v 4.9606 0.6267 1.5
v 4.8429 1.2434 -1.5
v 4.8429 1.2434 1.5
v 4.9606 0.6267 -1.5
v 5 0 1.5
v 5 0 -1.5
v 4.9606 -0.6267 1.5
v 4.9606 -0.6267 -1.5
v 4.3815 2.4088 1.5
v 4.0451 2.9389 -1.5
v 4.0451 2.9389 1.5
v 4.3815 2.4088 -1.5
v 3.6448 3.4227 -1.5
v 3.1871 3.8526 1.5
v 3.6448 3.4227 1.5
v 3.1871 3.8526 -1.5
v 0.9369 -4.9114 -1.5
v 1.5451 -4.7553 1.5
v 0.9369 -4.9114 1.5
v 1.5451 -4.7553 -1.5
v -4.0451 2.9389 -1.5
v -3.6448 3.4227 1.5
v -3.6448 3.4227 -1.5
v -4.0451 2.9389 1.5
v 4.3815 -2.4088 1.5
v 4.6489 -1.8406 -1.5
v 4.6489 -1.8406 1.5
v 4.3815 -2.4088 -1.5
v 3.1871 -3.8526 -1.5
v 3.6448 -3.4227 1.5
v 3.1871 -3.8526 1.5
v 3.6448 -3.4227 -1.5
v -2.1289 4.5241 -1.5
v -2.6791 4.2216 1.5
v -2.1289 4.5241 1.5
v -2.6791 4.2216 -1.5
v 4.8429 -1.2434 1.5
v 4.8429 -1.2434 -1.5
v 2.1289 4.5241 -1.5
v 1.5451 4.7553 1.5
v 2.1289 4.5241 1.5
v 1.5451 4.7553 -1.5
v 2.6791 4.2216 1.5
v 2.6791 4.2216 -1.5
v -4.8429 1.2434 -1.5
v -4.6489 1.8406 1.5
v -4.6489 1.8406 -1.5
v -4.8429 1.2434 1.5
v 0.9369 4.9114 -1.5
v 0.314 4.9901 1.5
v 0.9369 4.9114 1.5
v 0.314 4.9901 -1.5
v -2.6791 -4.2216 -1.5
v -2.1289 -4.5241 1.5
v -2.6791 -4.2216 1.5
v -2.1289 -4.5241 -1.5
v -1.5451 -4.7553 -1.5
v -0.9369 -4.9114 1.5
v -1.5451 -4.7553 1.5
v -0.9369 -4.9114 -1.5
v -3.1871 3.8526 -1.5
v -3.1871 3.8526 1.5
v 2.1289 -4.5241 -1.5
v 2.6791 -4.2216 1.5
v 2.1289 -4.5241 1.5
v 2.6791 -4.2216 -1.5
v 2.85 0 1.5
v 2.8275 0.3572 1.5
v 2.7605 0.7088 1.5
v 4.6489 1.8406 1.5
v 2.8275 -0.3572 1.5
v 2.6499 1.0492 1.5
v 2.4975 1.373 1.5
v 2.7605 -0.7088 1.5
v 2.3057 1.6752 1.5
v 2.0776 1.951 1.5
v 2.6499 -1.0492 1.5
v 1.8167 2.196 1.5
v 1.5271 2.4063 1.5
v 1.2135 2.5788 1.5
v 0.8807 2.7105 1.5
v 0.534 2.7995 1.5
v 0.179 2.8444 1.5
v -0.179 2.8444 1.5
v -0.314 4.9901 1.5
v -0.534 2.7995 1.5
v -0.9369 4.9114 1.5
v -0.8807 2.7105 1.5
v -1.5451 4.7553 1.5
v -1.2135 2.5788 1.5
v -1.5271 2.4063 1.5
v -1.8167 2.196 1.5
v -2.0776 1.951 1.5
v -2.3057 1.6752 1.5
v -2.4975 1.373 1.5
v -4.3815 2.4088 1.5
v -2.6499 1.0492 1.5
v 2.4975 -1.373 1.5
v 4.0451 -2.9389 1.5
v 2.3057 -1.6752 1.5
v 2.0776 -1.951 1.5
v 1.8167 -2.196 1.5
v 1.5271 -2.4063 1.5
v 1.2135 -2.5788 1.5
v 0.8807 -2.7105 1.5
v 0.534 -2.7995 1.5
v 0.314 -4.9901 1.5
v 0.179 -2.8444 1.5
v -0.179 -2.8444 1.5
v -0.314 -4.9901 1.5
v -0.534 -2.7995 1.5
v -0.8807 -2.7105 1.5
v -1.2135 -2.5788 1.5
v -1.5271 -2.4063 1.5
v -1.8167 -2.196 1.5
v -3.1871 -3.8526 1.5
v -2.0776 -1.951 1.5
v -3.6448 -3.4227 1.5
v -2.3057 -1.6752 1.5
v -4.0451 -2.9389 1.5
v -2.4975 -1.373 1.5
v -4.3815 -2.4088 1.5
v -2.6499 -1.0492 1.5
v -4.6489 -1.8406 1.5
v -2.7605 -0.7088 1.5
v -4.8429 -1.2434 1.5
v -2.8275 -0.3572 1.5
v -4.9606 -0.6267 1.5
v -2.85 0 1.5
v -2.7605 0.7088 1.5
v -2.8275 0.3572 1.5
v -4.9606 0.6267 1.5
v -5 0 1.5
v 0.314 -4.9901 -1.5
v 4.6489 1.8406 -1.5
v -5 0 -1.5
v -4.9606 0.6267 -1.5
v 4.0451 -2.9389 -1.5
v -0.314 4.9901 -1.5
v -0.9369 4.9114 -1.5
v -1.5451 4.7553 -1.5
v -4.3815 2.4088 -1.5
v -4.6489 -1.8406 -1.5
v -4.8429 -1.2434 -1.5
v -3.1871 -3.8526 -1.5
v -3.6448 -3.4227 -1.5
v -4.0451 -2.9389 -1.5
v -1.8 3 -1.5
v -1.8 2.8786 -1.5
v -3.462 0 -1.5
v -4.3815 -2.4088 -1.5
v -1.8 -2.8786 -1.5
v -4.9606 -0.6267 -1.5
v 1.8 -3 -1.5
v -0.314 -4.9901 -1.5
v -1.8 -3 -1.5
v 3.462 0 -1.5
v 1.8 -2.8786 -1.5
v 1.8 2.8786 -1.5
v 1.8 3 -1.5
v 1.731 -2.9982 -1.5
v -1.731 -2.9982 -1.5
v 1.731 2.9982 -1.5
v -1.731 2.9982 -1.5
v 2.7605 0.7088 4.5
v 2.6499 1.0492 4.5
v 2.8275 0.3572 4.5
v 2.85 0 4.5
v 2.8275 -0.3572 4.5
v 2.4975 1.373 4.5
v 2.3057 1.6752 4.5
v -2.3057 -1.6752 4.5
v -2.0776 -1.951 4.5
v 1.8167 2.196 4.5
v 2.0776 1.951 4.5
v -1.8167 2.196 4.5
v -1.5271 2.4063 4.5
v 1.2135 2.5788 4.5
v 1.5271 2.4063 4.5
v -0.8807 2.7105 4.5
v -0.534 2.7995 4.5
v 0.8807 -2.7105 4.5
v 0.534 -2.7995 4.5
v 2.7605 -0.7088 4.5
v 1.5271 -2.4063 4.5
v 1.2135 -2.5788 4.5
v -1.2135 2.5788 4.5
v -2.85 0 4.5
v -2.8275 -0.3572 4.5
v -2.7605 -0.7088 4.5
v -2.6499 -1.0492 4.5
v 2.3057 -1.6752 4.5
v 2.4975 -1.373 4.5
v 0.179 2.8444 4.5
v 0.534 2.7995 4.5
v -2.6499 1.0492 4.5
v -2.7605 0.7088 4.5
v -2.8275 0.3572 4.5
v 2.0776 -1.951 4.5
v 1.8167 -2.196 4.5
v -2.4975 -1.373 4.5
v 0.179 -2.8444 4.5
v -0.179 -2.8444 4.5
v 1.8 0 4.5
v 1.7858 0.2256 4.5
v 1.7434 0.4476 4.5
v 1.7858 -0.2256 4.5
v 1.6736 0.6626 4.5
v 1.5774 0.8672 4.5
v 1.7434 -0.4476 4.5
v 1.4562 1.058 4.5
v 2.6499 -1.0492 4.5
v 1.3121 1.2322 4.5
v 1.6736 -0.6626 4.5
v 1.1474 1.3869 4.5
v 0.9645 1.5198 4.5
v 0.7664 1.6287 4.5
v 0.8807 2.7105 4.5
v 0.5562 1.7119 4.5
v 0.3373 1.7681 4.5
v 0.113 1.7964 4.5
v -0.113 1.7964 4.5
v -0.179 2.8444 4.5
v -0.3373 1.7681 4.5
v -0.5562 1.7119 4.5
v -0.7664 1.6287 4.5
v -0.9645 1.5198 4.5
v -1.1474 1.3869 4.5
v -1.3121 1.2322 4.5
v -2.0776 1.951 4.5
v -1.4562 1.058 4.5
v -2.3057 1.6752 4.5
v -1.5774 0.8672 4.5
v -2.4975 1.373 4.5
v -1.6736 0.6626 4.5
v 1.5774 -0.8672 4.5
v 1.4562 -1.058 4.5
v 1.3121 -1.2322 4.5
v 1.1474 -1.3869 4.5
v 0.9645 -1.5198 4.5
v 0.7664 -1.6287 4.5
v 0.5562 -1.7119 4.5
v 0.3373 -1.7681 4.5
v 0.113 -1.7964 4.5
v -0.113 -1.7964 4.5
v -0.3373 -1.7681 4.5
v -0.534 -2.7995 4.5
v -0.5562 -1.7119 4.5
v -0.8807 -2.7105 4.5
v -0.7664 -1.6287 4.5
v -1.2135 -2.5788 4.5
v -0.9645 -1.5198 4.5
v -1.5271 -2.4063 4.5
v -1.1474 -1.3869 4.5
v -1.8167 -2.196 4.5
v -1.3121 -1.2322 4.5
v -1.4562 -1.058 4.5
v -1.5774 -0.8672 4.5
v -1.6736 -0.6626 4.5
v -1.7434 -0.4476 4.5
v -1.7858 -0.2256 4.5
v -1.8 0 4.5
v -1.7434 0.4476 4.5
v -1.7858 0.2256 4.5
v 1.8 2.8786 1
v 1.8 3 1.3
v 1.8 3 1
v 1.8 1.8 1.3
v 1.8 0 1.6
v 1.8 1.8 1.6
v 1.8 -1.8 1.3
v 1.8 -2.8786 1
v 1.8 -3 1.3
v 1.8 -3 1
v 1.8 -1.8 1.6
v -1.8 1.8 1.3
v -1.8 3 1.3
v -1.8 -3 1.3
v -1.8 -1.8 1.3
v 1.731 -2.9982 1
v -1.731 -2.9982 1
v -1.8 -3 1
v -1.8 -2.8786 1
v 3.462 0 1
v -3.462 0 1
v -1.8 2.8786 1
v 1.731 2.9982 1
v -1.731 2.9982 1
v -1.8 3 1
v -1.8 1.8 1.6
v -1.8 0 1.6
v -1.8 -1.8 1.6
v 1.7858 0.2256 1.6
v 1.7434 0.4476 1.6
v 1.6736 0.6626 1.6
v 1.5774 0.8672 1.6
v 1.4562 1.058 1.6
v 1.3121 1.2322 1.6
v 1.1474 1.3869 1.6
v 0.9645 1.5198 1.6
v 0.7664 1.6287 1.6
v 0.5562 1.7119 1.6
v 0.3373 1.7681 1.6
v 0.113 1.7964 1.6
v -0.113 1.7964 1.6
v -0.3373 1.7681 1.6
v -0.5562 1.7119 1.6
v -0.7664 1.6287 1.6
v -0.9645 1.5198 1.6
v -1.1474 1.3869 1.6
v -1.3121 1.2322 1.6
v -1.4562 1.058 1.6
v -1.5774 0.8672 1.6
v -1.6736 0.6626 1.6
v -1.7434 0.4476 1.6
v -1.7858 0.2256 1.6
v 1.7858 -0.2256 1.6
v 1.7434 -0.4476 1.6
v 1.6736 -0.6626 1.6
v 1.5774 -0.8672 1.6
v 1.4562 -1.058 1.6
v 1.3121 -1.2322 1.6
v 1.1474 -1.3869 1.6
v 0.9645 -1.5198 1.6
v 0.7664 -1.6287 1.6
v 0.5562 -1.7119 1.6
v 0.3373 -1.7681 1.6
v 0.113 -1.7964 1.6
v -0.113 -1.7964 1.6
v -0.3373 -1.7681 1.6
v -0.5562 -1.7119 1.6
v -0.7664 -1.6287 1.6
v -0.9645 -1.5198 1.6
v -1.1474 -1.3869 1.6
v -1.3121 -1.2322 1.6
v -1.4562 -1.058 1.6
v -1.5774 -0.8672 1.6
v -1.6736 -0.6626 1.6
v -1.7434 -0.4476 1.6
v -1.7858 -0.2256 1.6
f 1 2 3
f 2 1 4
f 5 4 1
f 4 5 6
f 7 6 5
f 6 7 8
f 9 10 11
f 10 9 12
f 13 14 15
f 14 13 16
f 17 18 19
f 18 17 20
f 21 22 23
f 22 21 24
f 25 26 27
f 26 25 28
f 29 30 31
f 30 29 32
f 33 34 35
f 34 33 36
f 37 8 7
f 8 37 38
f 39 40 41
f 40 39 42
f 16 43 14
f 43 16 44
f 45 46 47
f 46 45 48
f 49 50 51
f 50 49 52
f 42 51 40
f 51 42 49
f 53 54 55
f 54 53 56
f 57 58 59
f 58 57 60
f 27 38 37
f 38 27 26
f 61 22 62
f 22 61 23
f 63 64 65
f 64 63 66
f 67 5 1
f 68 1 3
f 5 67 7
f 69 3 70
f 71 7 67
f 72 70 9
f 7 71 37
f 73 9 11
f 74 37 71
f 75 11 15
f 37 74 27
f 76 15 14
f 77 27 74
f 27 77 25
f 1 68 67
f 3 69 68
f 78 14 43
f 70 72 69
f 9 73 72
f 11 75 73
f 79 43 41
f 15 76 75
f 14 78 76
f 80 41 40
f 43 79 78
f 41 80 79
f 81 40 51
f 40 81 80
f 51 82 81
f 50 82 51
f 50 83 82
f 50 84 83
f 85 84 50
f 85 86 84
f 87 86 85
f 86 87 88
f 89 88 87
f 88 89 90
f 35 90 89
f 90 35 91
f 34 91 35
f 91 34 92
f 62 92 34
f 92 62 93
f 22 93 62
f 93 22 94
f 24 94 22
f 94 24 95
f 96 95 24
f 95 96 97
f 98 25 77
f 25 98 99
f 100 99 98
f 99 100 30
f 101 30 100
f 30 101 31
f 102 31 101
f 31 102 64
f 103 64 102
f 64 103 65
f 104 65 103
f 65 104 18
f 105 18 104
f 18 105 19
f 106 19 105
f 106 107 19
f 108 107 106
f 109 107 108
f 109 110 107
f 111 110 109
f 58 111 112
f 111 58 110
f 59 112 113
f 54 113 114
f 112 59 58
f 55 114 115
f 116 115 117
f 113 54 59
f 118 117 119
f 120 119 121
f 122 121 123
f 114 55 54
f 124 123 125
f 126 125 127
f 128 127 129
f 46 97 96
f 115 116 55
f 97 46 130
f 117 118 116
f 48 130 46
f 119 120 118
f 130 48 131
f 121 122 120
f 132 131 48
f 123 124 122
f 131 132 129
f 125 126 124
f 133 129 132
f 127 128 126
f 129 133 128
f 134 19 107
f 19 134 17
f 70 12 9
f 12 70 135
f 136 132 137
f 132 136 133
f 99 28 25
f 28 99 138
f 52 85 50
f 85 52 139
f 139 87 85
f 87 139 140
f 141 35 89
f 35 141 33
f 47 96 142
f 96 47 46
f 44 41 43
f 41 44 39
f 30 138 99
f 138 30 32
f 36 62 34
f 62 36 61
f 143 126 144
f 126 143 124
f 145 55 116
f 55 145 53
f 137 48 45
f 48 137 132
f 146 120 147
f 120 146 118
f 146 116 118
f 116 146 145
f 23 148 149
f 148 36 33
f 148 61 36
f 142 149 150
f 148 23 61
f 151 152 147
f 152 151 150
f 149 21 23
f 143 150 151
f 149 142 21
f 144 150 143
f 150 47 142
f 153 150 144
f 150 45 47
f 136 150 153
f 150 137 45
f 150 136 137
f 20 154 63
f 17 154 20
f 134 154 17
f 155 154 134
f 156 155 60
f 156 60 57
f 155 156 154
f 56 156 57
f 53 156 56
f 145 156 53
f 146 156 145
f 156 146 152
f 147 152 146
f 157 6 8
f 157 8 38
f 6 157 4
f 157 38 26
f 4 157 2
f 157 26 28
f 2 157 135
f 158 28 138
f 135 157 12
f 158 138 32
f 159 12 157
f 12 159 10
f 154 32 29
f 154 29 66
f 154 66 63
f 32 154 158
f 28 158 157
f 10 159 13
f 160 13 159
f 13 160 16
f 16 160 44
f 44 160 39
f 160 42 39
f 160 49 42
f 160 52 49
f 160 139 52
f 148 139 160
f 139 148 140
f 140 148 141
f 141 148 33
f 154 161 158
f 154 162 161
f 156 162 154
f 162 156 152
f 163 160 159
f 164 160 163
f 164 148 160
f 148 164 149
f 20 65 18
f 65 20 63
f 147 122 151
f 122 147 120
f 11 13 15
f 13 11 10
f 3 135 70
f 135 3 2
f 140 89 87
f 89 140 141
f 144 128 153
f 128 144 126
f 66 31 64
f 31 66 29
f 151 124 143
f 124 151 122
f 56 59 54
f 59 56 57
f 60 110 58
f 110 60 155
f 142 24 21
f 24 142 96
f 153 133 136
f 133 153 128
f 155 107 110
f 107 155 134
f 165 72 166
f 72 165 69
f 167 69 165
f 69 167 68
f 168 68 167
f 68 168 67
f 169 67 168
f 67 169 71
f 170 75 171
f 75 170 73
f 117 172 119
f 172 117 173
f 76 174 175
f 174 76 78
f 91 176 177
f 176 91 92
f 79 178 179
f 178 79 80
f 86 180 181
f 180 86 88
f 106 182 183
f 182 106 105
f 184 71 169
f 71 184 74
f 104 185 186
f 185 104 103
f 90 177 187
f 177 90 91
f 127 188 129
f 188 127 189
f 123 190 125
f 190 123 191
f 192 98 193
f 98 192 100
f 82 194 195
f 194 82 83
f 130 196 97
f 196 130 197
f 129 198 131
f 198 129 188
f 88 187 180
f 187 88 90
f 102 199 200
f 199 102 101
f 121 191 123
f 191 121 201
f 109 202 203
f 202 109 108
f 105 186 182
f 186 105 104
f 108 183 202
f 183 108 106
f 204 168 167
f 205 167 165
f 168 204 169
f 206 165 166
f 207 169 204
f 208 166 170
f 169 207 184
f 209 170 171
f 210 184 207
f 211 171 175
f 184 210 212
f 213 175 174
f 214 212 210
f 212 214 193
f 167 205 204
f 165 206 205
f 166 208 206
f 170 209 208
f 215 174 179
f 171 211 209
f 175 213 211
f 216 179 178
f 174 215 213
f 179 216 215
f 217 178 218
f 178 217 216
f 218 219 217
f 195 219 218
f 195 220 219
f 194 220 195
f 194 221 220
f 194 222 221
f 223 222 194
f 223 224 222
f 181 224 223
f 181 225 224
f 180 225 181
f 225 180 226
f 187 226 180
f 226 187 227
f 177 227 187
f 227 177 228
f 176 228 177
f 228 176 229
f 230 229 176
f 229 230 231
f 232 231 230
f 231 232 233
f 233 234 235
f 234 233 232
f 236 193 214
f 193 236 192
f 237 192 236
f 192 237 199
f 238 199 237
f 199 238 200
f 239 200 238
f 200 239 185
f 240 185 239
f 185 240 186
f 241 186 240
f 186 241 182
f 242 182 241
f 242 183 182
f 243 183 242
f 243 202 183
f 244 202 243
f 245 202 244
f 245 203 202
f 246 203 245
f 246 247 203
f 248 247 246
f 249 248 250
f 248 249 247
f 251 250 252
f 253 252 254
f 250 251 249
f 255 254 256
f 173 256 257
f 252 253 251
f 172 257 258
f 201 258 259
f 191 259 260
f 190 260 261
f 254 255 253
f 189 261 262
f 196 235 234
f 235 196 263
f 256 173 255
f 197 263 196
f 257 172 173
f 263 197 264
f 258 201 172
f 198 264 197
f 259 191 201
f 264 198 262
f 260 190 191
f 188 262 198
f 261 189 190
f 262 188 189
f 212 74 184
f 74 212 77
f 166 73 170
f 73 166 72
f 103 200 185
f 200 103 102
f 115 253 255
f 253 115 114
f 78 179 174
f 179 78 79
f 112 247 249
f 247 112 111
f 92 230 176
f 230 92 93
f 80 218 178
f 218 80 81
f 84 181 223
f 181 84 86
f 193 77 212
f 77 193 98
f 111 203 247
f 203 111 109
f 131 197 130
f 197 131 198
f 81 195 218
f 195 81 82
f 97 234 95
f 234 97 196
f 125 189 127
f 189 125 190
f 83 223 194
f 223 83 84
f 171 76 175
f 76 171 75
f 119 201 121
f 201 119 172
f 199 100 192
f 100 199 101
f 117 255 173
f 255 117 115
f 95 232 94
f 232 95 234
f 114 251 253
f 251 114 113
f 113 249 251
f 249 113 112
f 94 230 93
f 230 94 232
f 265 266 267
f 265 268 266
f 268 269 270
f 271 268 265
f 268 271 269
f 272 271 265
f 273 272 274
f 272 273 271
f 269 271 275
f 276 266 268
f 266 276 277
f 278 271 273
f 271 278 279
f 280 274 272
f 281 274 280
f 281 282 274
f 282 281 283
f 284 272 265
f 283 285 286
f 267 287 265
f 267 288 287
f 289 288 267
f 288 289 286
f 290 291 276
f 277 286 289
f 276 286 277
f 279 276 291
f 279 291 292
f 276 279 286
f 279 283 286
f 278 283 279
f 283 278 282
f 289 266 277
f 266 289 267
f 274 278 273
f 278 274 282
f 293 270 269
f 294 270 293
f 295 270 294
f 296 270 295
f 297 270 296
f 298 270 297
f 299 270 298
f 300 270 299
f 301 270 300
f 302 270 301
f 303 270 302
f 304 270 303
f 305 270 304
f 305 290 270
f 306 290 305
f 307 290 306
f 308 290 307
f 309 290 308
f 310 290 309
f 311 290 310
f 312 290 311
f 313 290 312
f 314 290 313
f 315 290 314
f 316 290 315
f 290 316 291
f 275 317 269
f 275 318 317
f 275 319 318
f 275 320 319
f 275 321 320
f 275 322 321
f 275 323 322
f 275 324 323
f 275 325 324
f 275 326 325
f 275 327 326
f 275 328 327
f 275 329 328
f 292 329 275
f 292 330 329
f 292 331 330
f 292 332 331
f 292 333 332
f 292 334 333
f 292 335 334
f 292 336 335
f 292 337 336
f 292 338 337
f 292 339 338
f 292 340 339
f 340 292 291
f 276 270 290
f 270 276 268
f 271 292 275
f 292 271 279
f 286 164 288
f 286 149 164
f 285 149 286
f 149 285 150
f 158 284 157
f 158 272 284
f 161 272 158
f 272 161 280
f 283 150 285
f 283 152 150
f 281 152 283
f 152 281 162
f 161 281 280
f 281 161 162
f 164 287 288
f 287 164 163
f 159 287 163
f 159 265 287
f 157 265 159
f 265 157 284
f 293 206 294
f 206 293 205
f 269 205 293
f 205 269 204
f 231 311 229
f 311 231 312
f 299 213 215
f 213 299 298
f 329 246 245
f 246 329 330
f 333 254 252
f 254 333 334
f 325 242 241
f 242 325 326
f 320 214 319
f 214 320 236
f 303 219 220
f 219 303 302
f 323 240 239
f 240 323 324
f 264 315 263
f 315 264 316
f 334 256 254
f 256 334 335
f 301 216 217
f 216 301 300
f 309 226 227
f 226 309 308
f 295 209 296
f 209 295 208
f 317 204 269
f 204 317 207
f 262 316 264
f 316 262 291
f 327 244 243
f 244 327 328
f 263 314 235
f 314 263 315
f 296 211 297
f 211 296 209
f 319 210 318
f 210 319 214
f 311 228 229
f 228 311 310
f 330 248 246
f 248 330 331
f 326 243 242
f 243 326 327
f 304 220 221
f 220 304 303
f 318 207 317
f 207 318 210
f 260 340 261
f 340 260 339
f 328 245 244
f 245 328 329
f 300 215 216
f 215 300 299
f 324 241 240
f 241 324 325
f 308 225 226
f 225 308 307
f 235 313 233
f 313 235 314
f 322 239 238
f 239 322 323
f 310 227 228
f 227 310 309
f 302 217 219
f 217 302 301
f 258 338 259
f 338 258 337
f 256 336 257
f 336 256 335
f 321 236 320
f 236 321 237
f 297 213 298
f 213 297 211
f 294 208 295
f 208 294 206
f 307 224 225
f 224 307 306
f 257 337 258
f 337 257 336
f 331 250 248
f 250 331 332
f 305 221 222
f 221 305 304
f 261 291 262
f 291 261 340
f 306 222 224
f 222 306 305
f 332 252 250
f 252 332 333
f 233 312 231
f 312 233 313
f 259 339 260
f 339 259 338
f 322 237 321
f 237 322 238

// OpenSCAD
$fn = 50;


difference() {
	union() {
		translate(v = [0, 0, -1.5000000000]) {
			cylinder(h = 3, r = 5.0000000000);
		}
		translate(v = [0, 0, -1.5000000000]) {
			cylinder(h = 6, r = 2.8500000000);
		}
	}
	union() {
		translate(v = [0, 0, -1.5000000000]) {
			rotate(a = [0, 0, 0]) {
				difference() {
					union() {
						translate(v = [-1.8000000000, -3.0000000000, -0.3000000000]) {
							cube(size = [3.6000000000, 6.0000000000, 0.3000000000]);
						}
						translate(v = [-1.8000000000, -1.8000000000, -0.6000000000]) {
							cube(size = [3.6000000000, 3.6000000000, 0.3000000000]);
						}
						translate(v = [-1.8000000000, -3.0000000000, 2.5000000000]) {
							cube(size = [3.6000000000, 6.0000000000, 0.3000000000]);
						}
						translate(v = [-1.8000000000, -1.8000000000, 2.8000000000]) {
							cube(size = [3.6000000000, 3.6000000000, 0.3000000000]);
						}
						linear_extrude(height = 2.5000000000) {
							polygon(points = [[3.4620000000, 0.0000000000], [1.7310000000, 2.9981799479], [-1.7310000000, 2.9981799479], [-3.4620000000, 0.0000000000], [-1.7310000000, -2.9981799479], [1.7310000000, -2.9981799479]]);
						}
						translate(v = [-1.8000000000, -3.0000000000, -0.3000000000]) {
							cube(size = [3.6000000000, 6.0000000000, 0.3000000000]);
						}
						translate(v = [-1.8000000000, -1.8000000000, -0.6000000000]) {
							cube(size = [3.6000000000, 3.6000000000, 0.3000000000]);
						}
						translate(v = [-1.8000000000, -3.0000000000, 2.5000000000]) {
							cube(size = [3.6000000000, 6.0000000000, 0.3000000000]);
						}
						translate(v = [-1.8000000000, -1.8000000000, 2.8000000000]) {
							cube(size = [3.6000000000, 3.6000000000, 0.3000000000]);
						}
						translate(v = [-1.8000000000, -3.0000000000, -0.3000000000]) {
							cube(size = [3.6000000000, 6.0000000000, 0.3000000000]);
						}
						translate(v = [-1.8000000000, -1.8000000000, -0.6000000000]) {
							cube(size = [3.6000000000, 3.6000000000, 0.3000000000]);
						}
						translate(v = [-1.8000000000, -3.0000000000, 2.5000000000]) {
							cube(size = [3.6000000000, 6.0000000000, 0.3000000000]);
						}
						translate(v = [-1.8000000000, -1.8000000000, 2.8000000000]) {
							cube(size = [3.6000000000, 3.6000000000, 0.3000000000]);
						}
					}
					union();
				}
			}
		}
		translate(v = [0, 0, -50.0000000000]) {
			cylinder(h = 100, r = 1.8000000000);
		}
	}
}
